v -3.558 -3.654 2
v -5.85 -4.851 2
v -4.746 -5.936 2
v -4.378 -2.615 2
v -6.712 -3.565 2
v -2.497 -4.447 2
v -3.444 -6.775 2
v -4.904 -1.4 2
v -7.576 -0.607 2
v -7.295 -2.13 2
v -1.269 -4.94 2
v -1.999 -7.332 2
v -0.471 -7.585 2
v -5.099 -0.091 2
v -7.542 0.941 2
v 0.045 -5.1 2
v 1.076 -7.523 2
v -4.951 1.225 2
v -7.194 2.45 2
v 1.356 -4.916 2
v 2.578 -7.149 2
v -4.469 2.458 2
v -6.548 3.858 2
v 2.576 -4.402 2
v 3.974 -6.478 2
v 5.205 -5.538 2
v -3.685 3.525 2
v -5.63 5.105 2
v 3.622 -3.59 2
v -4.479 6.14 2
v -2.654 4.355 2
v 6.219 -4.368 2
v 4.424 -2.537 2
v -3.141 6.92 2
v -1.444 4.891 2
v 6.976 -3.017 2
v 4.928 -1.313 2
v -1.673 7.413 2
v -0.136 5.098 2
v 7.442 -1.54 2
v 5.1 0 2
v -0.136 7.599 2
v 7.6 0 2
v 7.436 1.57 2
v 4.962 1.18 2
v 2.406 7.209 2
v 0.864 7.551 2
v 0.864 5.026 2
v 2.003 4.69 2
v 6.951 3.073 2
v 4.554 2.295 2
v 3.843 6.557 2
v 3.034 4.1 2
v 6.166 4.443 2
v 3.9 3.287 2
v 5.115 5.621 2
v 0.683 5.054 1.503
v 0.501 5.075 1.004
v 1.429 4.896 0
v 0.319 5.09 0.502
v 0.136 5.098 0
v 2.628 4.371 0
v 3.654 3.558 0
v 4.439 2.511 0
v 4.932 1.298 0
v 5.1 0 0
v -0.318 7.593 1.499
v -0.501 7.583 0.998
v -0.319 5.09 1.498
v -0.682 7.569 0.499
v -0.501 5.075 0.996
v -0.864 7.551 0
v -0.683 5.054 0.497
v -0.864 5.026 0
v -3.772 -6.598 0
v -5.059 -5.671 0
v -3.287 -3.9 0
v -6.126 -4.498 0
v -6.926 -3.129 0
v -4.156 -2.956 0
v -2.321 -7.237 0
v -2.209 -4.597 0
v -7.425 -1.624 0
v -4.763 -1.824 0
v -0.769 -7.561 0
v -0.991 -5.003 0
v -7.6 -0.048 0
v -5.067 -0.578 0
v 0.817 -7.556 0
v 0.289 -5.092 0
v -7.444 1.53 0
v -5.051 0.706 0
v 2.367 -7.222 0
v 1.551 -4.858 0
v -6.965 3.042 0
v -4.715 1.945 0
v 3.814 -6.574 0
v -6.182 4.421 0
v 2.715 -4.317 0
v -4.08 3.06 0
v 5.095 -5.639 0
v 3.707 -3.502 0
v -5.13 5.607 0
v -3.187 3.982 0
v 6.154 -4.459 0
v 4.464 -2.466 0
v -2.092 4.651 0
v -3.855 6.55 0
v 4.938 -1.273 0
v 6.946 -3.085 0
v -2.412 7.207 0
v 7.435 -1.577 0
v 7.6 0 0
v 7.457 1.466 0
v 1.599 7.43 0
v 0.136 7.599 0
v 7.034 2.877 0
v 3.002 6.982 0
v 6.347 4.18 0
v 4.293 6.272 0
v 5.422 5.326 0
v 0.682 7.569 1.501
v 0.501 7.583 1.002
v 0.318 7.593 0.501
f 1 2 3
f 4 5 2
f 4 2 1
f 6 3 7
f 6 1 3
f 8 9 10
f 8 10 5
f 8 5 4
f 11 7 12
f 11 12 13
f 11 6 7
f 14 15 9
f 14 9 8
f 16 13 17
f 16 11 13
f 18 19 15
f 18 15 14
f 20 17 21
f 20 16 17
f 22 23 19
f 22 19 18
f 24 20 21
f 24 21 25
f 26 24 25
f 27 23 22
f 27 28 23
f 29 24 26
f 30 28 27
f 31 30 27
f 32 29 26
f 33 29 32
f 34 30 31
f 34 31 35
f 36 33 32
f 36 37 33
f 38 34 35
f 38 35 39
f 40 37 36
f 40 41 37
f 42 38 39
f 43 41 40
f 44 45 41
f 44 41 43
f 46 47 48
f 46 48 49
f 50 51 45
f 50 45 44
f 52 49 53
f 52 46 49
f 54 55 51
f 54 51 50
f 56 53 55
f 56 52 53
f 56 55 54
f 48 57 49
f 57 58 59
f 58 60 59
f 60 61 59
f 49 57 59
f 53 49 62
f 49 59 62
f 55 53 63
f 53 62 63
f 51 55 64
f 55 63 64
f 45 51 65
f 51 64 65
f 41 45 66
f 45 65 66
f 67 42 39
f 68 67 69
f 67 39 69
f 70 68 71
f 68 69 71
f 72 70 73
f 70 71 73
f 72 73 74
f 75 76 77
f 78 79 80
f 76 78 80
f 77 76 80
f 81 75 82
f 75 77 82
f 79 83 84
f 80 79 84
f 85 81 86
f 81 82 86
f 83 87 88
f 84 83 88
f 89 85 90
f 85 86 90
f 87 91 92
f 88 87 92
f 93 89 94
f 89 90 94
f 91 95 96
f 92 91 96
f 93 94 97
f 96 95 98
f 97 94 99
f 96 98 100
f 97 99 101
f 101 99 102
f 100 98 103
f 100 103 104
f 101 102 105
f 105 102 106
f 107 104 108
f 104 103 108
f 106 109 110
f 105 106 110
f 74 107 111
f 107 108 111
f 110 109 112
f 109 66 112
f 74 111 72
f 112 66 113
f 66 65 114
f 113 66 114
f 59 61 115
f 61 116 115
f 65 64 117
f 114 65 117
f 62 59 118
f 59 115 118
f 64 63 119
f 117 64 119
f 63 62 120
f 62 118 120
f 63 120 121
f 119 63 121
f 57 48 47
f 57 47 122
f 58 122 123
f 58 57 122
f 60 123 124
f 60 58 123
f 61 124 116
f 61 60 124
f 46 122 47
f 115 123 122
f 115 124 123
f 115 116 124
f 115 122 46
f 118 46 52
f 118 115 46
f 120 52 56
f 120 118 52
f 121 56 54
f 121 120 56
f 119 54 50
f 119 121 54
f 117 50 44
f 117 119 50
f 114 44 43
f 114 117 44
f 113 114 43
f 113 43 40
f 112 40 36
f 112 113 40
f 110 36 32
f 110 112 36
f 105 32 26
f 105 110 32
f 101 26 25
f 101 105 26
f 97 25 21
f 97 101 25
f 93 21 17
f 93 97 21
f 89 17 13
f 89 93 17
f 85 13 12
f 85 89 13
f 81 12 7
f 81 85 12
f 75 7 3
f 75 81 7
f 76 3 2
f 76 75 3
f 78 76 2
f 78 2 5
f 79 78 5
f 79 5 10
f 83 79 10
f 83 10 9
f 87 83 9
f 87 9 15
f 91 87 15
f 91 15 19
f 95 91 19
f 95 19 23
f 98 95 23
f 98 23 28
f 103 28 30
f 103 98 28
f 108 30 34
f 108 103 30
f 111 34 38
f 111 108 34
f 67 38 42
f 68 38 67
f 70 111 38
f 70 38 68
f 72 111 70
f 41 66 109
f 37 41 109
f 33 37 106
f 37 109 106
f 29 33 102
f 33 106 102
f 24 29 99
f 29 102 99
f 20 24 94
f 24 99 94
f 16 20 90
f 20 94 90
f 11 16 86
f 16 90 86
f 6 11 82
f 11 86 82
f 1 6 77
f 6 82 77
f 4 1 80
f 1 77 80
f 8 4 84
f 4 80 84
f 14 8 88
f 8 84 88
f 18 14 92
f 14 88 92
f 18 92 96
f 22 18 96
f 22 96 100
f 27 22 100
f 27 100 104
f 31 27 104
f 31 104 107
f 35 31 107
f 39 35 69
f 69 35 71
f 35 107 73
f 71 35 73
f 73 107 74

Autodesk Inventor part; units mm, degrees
ref_plane "XZ Plane" through (0, 0, 0) normal (0, 1, 0) x (-1, 0, 0)
ref_plane "XY Plane" through (0, 0, 0) normal (0, 0, 1) x (1, 0, 0)
sketch "Sketch1" plane through (0, 0, 0) normal (0, 0, 1) x (1, 0, 0)
  circle A0 centre (0, 0) radius 7.6
  circle A1 centre (0, 0) radius 5.1
  line L0 (-2.59, 0) -> (2.59, 0) construction
  line L1 (0, -2.59) -> (0, 2.59) construction
  dimension "d0" = 15.2
  dimension "d1" = 10.2
extrude "Выдавливание1" add sketch "Sketch1" along normal blind 2
sketch "Sketch2" plane through (0, 0, 0) normal (0, 1, 0) x (-1, 0, 0)
  line L0 (-5.1, 2) -> (5.1, 2) construction
  line L1 (5.1, 0) -> (-5.1, 0) construction
  line L2 (-0.864, 2) -> (-0.136, 0)
  line L3 (0.136, 2) -> (0.864, 0)
  line L4 (0, 0) -> (0, 2) construction
  line L5 (0, 1) -> (-0.364, 2) construction
  line L6 (-0.864, 2) -> (0.136, 2)
  line L7 (-0.136, 0) -> (0.864, 0)
  dimension "d4" = 70
  dimension "d13" = 1
extrude "Выдавливание2" cut sketch "Sketch2" along normal through all
ref_plane "Work Plane1" through (0, 0, 0) normal (1, 0, 0) x (0, 1, 0)
equation "\"d0\" = d + 2 * b"
equation "\"d1\" = d"
equation "\"d2\" = s_"
equation "\"d4\" = Angle"
equation "\"d13\" = 0.5 * s_"
equation "\"d7\" = s_"
equation "\"d\" = 10.2"
equation "\"b\" = 2.5"
equation "\"s_\" = 2"
equation "\"D_\" = 15.2"
equation "\"Angle\" = 70deg"
properties part number "Шайба 2 10Л ГОСТ 6402-78" material "Сталь, мягкая"
